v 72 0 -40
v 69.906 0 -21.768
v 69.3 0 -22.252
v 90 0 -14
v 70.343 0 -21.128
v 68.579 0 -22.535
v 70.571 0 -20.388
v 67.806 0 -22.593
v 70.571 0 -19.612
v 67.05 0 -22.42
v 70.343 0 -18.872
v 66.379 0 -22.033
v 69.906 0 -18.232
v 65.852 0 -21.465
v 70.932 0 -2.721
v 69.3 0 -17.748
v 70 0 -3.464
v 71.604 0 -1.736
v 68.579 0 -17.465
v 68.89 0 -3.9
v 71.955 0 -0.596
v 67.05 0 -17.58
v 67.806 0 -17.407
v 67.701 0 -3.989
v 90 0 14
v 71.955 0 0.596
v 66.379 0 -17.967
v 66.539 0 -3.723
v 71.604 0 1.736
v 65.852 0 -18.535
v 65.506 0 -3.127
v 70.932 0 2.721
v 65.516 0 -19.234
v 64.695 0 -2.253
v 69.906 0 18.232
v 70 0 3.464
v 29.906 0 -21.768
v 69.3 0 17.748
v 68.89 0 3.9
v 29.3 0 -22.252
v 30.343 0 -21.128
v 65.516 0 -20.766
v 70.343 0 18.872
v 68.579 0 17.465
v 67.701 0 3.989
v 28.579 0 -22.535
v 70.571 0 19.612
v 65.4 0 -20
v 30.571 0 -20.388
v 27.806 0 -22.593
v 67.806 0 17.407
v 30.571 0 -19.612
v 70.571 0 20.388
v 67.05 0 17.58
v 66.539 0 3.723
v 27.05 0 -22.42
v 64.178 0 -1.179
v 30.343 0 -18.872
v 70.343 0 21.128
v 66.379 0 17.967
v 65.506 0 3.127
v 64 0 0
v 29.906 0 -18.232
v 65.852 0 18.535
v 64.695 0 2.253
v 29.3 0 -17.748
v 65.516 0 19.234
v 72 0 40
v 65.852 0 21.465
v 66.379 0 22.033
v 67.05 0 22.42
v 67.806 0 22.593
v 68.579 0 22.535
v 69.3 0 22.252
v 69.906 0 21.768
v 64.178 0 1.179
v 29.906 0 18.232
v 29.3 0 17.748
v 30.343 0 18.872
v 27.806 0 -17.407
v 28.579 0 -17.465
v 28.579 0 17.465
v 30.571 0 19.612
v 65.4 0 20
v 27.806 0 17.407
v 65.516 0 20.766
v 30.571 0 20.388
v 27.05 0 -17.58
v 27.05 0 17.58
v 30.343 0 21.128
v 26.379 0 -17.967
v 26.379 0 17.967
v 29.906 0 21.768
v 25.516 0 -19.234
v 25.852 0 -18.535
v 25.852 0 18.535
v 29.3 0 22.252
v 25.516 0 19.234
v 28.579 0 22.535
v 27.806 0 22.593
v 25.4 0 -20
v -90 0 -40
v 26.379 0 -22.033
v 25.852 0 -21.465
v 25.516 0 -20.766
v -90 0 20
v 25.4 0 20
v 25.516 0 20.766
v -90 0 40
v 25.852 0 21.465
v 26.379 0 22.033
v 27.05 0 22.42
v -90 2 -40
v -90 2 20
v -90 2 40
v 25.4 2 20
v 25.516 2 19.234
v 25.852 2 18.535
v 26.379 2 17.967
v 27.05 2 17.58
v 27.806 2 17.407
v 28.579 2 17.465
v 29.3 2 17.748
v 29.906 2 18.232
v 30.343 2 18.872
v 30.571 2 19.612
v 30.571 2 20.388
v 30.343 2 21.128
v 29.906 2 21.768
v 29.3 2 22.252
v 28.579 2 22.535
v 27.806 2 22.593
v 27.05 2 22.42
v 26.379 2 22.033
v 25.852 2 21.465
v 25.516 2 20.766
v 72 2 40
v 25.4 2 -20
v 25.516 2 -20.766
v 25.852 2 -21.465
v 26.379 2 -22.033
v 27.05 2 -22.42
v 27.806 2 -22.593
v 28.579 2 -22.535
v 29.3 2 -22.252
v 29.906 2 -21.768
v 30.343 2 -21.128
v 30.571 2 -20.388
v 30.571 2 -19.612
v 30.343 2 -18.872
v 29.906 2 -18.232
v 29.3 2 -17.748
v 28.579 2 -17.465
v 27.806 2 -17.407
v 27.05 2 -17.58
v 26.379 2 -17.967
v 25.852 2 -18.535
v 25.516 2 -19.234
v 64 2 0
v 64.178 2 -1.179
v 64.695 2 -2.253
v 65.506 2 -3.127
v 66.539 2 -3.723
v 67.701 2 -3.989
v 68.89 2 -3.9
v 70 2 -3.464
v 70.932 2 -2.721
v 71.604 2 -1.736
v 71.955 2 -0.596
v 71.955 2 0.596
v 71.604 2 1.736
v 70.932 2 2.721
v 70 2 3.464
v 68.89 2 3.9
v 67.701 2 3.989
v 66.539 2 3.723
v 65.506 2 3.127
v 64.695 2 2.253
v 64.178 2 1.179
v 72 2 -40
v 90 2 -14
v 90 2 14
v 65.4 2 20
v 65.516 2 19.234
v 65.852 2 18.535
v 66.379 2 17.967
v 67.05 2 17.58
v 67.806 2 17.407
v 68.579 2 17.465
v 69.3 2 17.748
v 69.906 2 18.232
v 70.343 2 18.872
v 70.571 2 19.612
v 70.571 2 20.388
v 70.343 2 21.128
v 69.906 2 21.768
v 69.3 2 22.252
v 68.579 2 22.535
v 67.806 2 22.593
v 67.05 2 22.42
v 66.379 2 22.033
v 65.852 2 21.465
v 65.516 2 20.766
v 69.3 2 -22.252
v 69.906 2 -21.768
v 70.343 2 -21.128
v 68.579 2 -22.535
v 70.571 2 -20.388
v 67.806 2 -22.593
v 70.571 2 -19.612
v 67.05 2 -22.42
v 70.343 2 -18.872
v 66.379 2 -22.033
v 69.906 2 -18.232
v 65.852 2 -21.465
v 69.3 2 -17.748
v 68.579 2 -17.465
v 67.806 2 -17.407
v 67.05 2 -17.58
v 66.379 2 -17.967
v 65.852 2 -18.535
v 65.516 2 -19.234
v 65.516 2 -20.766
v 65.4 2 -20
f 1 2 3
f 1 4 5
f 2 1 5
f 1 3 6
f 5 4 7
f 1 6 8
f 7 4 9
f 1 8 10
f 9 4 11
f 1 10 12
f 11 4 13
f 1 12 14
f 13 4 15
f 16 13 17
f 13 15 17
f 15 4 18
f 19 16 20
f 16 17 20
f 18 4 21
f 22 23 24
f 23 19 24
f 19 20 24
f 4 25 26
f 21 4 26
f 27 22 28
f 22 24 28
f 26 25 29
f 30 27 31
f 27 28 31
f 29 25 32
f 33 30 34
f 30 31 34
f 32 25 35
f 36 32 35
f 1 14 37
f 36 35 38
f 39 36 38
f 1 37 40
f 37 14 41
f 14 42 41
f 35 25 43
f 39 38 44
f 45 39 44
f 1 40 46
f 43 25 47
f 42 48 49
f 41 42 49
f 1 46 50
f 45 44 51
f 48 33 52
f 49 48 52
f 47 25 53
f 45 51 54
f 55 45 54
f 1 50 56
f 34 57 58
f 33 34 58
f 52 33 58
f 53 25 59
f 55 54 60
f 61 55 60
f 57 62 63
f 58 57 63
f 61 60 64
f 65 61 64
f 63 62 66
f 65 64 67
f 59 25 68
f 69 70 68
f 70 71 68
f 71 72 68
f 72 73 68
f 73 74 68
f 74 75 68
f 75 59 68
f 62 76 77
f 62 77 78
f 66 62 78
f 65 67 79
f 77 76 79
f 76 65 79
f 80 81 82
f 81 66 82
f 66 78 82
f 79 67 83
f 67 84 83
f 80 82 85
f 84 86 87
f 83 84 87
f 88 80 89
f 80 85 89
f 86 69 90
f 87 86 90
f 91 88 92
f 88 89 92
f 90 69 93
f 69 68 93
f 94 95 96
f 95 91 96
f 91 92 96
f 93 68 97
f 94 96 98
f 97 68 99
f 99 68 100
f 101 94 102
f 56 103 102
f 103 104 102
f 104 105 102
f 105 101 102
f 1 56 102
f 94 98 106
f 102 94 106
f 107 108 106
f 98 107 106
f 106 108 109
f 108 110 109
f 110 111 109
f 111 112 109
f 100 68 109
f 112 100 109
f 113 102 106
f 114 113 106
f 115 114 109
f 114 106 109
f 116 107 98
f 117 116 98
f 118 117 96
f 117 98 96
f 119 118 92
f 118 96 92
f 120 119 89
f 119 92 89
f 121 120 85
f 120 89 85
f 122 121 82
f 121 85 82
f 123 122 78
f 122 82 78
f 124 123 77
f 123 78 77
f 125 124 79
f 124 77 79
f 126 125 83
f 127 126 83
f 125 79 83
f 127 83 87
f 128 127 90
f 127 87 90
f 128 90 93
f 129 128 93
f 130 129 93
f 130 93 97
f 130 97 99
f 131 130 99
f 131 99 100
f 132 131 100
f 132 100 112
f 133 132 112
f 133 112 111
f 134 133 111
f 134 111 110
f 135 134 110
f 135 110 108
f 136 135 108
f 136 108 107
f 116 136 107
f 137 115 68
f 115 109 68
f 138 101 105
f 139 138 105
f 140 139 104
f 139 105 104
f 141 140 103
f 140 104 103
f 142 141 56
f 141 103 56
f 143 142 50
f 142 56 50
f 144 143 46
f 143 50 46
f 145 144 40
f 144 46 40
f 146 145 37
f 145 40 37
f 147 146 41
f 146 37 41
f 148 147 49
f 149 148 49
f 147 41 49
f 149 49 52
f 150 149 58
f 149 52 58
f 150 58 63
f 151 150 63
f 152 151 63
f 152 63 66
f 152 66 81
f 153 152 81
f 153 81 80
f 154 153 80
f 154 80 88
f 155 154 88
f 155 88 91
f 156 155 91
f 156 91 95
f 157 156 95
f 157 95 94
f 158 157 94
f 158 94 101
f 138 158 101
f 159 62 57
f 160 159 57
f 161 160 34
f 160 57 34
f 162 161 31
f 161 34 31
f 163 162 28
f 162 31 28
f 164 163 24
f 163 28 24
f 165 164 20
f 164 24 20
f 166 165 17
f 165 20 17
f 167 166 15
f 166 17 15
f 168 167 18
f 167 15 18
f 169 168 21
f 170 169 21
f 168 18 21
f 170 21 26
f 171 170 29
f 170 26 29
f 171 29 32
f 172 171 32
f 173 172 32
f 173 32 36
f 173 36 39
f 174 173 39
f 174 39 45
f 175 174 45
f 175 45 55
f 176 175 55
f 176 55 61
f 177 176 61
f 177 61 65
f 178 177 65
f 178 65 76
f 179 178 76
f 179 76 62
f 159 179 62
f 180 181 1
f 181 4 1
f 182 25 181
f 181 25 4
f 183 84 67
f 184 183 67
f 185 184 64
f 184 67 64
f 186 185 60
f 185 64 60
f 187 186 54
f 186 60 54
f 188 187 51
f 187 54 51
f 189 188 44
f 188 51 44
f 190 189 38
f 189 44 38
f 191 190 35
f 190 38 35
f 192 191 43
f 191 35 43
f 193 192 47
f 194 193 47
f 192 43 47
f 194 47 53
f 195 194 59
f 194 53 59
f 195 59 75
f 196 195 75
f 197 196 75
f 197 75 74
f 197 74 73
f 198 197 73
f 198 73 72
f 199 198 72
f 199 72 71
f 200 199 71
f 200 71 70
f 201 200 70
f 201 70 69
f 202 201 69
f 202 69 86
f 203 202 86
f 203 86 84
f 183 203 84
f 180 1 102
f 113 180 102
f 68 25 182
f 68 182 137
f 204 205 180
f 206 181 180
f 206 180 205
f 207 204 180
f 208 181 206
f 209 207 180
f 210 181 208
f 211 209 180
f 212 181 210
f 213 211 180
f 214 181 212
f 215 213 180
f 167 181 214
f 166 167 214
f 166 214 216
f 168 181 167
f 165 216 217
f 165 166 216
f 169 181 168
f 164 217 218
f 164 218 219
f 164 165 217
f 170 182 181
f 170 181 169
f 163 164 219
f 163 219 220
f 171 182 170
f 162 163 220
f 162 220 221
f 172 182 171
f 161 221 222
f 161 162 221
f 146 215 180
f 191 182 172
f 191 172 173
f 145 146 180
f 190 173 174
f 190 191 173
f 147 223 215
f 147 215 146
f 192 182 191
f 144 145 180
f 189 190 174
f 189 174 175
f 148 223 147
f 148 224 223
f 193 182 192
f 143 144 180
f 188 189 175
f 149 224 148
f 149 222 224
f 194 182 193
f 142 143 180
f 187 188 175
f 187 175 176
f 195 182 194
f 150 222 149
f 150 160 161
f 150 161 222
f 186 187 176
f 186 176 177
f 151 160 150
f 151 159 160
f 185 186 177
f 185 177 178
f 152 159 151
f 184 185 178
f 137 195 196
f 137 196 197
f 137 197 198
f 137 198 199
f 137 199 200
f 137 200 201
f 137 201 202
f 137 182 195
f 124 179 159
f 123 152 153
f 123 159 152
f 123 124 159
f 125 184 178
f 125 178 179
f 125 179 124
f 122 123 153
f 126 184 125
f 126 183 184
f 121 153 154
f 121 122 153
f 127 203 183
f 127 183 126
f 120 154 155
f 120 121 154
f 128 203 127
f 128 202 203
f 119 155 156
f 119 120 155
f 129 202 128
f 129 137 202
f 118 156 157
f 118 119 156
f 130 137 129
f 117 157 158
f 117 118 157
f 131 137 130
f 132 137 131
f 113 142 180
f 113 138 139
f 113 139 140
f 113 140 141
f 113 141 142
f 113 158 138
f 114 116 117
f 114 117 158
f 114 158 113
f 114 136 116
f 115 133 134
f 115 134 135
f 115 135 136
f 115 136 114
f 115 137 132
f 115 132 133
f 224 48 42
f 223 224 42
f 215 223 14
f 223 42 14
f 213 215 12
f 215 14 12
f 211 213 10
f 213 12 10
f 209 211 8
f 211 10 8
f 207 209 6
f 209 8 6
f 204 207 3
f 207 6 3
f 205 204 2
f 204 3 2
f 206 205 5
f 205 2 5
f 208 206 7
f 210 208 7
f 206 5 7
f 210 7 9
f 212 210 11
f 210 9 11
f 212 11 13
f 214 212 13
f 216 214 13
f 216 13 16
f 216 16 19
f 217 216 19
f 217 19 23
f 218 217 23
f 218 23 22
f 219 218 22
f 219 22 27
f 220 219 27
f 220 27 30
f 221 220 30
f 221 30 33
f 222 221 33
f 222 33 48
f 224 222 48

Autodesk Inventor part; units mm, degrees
ref_plane "YZ Plane" through (0, 0, 0) normal (1, 0, 0) x (0, 1, 0)
ref_plane "XZ Plane" through (0, 0, 0) normal (0, 1, 0) x (-1, 0, 0)
ref_plane "XY Plane" through (0, 0, 0) normal (0, 0, 1) x (1, 0, 0)
sketch "Sketch1" plane through (0, 0, 0) normal (0, 1, 0) x (-1, 0, 0)
  line L0 (-90, -40) -> (90, -40)
  line L1 (90, -40) -> (90, 40)
  line L2 (90, 40) -> (-90, 40)
  line L3 (-90, 40) -> (-90, -40)
  line L4 (-90, -40) -> (90, 40) construction
  line L5 (90, -40) -> (-90, 40) construction
  line L6 (90, 40) -> (90, 20)
  line L7 (90, 20) -> (-28, 20)
  line L8 (-28, 20) -> (-28, -20)
  line L9 (-28, -20) -> (-68, -20)
  line L10 (-68, -20) -> (-68, 20)
  line L11 (-68, 20) -> (-28, 20)
  line L12 (90, -40) -> (-72, -40)
  line L13 (90, 40) -> (-72, 40)
  line L14 (-90, 0) -> (-90, 14)
  line L15 (-90, 14) -> (-72, 40)
  line L16 (-90, 0) -> (-90, -14)
  line L17 (-90, -14) -> (-72, -40)
  circle A0 centre (-68, 20) radius 2.6
  circle A1 centre (-68, -20) radius 2.6
  circle A2 centre (-28, -20) radius 2.6
  circle A3 centre (-28, 20) radius 2.6
  circle A4 centre (-68, 0) radius 4
  point P0 (0, 0)
  dimension "d0" = 180
  dimension "d1" = 80
  dimension "d2" = 20
  dimension "d3" = 118
  dimension "d4" = 40
  dimension "d5" = 40
  dimension "d6" = 162
  dimension "d7" = 162
  dimension "d8" = 14
  dimension "d9" = 14
  dimension "d10" = 5.2
  dimension "d11" = 5.2
  dimension "d12" = 5.2
  dimension "d13" = 5.2
  dimension "d14" = 8
extrude "Extrusion1" add sketch "Sketch1" along normal blind 2 contours L17 L3 L15 L2 L1 L0 | A3 L8 A2 L9 A1 L10 A4 A0 L11
properties part number "motorholder"
